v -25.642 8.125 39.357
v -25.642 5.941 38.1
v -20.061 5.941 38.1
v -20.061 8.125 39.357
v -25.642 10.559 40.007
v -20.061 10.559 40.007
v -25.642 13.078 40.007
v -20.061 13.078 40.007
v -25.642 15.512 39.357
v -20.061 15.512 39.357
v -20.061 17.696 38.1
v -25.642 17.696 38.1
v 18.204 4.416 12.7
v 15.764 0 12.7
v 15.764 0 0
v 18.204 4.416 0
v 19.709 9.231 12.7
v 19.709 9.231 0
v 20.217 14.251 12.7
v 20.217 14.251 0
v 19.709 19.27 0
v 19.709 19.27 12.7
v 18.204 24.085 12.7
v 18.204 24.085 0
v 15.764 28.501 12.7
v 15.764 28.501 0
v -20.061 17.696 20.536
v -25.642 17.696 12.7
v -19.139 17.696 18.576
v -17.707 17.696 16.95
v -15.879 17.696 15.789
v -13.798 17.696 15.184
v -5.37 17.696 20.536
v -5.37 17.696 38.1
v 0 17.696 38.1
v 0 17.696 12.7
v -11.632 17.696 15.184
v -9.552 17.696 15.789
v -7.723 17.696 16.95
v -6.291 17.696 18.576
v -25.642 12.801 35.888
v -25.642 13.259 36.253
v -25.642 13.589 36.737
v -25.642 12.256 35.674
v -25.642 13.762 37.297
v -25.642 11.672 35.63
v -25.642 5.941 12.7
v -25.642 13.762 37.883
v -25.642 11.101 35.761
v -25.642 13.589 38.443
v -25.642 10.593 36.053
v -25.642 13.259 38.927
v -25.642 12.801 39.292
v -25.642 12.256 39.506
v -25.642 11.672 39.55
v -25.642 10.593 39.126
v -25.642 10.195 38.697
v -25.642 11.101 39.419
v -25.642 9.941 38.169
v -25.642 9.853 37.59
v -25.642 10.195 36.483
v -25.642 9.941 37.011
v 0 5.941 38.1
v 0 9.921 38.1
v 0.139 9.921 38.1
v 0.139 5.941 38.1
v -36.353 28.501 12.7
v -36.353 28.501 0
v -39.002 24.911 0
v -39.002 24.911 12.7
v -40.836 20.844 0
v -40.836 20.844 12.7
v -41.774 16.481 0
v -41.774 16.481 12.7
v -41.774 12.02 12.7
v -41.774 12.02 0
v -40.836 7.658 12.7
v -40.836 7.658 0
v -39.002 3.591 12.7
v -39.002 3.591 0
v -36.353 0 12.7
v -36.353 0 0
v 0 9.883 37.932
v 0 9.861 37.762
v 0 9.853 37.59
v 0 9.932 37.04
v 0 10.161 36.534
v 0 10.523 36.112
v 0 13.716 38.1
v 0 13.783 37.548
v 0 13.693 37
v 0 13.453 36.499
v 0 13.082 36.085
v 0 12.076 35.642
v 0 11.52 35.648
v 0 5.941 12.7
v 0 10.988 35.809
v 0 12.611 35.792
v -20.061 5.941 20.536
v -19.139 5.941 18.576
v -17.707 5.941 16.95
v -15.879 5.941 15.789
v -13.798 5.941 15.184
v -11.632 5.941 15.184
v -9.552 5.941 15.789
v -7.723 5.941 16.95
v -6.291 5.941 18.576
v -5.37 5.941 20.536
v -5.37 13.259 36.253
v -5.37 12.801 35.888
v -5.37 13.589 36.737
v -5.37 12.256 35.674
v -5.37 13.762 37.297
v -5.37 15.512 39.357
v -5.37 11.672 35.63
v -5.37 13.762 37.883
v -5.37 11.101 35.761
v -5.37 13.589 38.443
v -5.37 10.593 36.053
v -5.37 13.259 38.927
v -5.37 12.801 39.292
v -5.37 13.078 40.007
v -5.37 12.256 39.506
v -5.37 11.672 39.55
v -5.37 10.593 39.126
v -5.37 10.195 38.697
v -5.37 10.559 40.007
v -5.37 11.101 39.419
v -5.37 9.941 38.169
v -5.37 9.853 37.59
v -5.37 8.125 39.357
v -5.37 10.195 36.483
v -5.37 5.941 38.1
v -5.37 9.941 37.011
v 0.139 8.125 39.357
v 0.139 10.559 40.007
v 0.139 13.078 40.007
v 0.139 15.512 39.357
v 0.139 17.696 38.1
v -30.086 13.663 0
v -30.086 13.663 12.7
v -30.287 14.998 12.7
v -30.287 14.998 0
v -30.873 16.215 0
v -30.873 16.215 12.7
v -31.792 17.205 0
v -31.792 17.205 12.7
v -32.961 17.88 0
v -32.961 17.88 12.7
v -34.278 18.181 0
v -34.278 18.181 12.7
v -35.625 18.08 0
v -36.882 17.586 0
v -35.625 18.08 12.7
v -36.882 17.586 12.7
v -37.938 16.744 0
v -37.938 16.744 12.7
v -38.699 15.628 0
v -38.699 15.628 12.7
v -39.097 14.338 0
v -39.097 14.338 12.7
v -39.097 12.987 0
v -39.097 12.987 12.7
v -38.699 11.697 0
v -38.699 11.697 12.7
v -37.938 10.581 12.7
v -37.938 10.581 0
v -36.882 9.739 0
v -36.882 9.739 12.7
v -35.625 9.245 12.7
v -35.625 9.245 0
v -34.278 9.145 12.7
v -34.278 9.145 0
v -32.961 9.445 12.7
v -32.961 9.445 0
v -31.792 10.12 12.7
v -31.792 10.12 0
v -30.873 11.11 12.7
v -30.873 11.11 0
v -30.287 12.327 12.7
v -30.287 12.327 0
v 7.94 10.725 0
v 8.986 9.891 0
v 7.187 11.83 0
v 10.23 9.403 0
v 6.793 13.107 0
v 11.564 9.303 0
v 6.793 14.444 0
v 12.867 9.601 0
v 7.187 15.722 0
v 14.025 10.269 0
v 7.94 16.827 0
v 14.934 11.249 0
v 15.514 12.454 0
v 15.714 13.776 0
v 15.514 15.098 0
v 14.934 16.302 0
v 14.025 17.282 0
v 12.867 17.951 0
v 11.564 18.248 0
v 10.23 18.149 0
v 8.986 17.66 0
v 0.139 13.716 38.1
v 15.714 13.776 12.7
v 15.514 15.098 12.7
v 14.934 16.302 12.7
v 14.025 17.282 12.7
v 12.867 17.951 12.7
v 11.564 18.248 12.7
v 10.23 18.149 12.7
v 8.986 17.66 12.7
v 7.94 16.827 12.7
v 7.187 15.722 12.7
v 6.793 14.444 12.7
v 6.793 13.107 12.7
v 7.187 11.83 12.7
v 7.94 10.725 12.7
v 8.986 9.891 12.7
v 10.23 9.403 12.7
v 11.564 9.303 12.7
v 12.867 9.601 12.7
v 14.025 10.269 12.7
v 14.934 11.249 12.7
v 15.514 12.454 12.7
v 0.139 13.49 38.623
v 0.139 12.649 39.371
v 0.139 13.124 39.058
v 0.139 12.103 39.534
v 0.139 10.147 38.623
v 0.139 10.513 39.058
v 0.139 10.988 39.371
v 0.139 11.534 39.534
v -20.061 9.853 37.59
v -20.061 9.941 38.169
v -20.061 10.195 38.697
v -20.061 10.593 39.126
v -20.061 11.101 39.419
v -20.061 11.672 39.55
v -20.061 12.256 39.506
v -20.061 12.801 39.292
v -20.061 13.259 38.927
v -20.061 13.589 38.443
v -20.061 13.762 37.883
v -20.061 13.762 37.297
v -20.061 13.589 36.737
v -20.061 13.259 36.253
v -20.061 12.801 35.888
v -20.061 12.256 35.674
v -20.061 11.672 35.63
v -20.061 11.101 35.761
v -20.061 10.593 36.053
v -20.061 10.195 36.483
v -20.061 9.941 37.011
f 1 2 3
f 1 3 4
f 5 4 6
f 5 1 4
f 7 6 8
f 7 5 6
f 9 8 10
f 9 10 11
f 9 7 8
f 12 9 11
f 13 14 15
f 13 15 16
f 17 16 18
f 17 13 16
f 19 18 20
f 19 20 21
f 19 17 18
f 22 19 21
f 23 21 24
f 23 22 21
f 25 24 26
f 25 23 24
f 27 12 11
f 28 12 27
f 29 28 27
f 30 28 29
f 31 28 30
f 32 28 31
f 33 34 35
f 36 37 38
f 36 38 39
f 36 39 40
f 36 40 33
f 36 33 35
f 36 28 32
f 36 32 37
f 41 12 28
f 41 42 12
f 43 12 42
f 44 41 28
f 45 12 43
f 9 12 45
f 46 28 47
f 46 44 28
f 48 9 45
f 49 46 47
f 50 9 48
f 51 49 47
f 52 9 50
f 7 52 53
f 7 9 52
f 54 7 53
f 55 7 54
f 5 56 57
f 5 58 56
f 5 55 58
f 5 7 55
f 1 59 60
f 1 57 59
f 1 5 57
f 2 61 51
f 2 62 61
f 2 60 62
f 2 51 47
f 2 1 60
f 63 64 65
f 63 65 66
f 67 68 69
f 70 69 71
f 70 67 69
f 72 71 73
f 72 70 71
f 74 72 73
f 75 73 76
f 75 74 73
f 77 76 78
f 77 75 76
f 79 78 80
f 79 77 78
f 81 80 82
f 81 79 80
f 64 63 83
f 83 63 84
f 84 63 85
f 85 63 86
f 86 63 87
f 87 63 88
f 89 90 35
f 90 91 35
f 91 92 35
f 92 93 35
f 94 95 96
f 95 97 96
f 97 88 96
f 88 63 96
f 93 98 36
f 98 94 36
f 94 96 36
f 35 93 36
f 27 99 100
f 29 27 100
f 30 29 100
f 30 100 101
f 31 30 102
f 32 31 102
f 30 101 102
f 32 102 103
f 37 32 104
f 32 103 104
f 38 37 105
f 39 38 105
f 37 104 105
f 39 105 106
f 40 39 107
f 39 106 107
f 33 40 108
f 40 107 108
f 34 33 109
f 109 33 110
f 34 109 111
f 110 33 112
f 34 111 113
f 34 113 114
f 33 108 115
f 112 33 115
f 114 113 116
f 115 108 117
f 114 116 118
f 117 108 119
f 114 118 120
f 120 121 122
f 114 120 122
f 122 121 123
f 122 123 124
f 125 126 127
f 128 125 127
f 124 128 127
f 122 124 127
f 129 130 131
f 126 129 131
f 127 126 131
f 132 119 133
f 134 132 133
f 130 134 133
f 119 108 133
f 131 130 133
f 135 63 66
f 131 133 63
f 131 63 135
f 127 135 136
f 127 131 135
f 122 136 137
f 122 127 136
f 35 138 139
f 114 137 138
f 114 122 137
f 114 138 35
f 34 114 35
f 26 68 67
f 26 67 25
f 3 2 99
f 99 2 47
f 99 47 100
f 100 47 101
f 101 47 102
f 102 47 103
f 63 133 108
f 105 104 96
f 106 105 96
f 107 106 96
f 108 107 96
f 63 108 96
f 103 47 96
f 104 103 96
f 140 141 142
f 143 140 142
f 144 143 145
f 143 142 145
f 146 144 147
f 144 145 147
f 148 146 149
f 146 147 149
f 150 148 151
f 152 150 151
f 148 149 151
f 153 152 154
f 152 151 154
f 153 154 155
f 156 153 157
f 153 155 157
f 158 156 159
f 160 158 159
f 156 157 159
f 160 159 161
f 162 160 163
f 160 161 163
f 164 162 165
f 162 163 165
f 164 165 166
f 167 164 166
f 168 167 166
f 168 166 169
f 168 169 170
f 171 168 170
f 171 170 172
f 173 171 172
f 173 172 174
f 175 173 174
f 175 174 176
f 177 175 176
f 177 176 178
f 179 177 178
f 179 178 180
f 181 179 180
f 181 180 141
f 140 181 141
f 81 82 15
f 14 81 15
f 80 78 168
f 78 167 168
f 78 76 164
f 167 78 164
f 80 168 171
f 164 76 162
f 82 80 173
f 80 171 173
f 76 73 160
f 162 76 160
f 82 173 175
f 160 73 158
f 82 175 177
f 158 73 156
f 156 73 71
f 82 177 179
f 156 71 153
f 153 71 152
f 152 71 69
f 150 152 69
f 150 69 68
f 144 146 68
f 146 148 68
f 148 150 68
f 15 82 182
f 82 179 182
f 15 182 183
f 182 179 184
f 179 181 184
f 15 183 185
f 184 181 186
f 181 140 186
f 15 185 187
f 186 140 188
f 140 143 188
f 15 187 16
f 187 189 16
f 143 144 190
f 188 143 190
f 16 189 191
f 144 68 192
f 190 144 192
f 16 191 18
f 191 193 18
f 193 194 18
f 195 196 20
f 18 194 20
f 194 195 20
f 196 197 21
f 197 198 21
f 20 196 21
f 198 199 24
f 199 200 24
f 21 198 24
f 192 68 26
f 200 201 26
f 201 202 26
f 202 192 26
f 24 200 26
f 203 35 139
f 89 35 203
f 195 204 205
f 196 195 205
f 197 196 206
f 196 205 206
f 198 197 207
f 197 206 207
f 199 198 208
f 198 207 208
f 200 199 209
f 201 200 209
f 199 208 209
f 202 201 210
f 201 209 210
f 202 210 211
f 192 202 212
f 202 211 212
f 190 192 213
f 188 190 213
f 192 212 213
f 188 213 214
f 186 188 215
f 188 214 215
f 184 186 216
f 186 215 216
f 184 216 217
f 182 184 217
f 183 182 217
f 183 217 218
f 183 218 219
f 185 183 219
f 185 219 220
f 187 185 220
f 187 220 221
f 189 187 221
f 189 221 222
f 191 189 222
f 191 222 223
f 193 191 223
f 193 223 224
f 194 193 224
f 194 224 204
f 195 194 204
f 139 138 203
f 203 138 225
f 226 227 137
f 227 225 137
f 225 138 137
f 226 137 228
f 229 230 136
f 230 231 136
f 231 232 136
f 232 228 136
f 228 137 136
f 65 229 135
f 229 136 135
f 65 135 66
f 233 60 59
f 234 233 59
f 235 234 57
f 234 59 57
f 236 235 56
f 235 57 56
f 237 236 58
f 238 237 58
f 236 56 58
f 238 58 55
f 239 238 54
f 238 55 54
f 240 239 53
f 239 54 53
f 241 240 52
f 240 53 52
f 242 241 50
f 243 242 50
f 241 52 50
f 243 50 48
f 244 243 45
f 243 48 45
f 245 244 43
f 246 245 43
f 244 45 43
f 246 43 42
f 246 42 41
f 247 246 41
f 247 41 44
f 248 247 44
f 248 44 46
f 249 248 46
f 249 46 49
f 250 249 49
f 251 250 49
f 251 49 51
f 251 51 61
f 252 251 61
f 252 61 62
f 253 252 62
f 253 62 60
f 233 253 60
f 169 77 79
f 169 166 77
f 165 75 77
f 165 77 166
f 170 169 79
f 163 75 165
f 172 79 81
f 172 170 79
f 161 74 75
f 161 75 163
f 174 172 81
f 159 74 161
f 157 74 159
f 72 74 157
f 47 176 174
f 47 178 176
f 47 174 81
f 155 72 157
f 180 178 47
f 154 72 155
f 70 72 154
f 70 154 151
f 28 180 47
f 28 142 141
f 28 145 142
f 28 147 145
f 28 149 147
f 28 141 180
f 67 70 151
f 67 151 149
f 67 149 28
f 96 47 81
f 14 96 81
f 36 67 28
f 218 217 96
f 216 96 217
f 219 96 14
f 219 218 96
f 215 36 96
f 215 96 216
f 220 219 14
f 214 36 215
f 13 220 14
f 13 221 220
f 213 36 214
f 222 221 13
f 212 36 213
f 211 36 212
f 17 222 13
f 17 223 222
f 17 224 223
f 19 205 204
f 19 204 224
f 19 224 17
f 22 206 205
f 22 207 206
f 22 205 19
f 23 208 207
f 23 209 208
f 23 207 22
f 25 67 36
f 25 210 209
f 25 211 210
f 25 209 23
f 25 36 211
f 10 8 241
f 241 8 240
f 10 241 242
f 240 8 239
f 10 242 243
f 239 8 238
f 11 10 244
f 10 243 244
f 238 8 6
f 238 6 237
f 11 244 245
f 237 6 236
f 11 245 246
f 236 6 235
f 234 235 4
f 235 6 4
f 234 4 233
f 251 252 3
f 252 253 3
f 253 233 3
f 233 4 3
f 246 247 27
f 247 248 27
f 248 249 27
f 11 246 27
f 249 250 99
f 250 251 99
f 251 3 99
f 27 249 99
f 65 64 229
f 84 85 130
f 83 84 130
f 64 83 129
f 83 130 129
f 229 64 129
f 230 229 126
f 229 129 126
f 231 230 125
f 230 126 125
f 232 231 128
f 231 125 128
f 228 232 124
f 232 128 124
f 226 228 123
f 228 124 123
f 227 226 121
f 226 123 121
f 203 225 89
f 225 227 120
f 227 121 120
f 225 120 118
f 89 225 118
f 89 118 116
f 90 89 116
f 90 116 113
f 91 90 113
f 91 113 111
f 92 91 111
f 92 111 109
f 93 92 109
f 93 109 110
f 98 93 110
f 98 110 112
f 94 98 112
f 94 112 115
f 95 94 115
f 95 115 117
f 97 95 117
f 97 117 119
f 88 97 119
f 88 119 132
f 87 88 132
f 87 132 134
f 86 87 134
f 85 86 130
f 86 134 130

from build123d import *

# Parameters (mm, degrees)
F0_W      = 52.1168857813
F0_H      = 28.5012163222
F1_DEPTH  = 12.7
F3_DEPTH  = 12.7
F5_DEPTH  = 12.7
F6_W      = 25.6421938539
F6_H      = 11.7544634268
F7_DEPTH  = 25.4
F9_DEPTH  = 25.781
F10_W     = 14.6912932396
F10_H     = 17.5639255852
F11_DEPTH = 22.5609156693
F12_R     = 4.5307401999
F12_R_2   = 4.4852627038
F13_DEPTH = 12.701
F14_R     = 1.9651697752
F15_DEPTH = 45.8603734278
F17_DEPTH = 22.5609156693


with BuildPart() as f1:
    # F0 (on Top) → F1 (new body)
    with BuildSketch(Plane.XY):
        with Locations((-10.29464975, 14.2506081611)):
            Rectangle(F0_W, F0_H)
    extrude(amount=F1_DEPTH)

    # F2 (on face) → F3 (join)
    with BuildSketch(Plane.XY.offset(12.7)):
        with BuildLine():
            Line((-36.3530926406, 0), (-36.3530926406, 28.5012163222))
            ThreePointArc((-36.3530926406, 28.5012163222), (-41.8927435543, 14.2506081611), (-36.3530926406, 0))
        make_face()
    extrude(amount=-F3_DEPTH)

    # F4 (on face) → F5 (join)
    with BuildSketch(Plane.XY.offset(12.7)):
        with BuildLine():
            Line((15.7637931406, 28.5012163222), (15.7637931406, 0))
            ThreePointArc((15.7637931406, 0), (20.217179574, 14.2506081611), (15.7637931406, 28.5012163222))
        make_face()
    extrude(amount=-F5_DEPTH)

    # F6 (on face) → F7 (join)
    with BuildSketch(Plane.XY.offset(12.7)):
        with Locations((-12.8210969269, 11.8185323663)):
            Rectangle(F6_W, F6_H)
    extrude(amount=F7_DEPTH)

    # F8 (on face) → F9 (join)
    with BuildSketch(Plane(origin=(-25.6421938539, 0, 0), x_dir=(0, -1, 0), z_dir=(-1, 0, 0))):
        with BuildLine():
            Line((-17.6957640797, 38.1), (-5.9413006529, 38.1))
            ThreePointArc((-5.9413006529, 38.1), (-11.8185323663, 40.0893589301), (-17.6957640797, 38.1))
        make_face()
    extrude(amount=-F9_DEPTH)

    # F10 (on face) → F11 (cut, through all)
    with BuildSketch(Plane.XZ.offset(-5.9413006529)):
        Polygon((-5.3697098047, 40.5042394996), (-20.0610030442, 40.2643792331), (-20.0610030442, 38.1), (-5.3697098047, 38.1), align=None)
        with Locations((-12.7153564245, 29.3180372074)):
            Rectangle(F10_W, F10_H)
    extrude(amount=-F11_DEPTH, mode=Mode.SUBTRACT)

    # F12 (on face) → F13 (cut, through all)
    with BuildSketch(Plane.XY.offset(12.7)):
        with Locations((-34.616753459, 13.6625757441)):
            Circle(F12_R)
        with Locations((11.228363961, 13.7757733464)):
            Circle(F12_R_2)
    extrude(amount=-F13_DEPTH, mode=Mode.SUBTRACT)

    # F14 (on face) → F15 (cut, through all)
    with BuildSketch(Plane(origin=(-25.6421938539, 0, 0), x_dir=(0, -1, 0), z_dir=(-1, 0, 0))):
        with Locations((-11.8185323663, 37.5899001956)):
            Circle(F14_R)
    extrude(amount=-F15_DEPTH, mode=Mode.SUBTRACT)

    # F16 (on face) → F17 (cut, through all)
    with BuildSketch(Plane.XZ.offset(-5.9413006529)):
        with BuildLine():
            Line((-5.3697098047, 20.5360744148), (-20.0610030442, 20.5360744148))
            ThreePointArc((-20.0610030442, 20.5360744148), (-12.7153564245, 15.1077599737), (-5.3697098047, 20.5360744148))
        make_face()
    extrude(amount=-F17_DEPTH, mode=Mode.SUBTRACT)


solid = f1.part
